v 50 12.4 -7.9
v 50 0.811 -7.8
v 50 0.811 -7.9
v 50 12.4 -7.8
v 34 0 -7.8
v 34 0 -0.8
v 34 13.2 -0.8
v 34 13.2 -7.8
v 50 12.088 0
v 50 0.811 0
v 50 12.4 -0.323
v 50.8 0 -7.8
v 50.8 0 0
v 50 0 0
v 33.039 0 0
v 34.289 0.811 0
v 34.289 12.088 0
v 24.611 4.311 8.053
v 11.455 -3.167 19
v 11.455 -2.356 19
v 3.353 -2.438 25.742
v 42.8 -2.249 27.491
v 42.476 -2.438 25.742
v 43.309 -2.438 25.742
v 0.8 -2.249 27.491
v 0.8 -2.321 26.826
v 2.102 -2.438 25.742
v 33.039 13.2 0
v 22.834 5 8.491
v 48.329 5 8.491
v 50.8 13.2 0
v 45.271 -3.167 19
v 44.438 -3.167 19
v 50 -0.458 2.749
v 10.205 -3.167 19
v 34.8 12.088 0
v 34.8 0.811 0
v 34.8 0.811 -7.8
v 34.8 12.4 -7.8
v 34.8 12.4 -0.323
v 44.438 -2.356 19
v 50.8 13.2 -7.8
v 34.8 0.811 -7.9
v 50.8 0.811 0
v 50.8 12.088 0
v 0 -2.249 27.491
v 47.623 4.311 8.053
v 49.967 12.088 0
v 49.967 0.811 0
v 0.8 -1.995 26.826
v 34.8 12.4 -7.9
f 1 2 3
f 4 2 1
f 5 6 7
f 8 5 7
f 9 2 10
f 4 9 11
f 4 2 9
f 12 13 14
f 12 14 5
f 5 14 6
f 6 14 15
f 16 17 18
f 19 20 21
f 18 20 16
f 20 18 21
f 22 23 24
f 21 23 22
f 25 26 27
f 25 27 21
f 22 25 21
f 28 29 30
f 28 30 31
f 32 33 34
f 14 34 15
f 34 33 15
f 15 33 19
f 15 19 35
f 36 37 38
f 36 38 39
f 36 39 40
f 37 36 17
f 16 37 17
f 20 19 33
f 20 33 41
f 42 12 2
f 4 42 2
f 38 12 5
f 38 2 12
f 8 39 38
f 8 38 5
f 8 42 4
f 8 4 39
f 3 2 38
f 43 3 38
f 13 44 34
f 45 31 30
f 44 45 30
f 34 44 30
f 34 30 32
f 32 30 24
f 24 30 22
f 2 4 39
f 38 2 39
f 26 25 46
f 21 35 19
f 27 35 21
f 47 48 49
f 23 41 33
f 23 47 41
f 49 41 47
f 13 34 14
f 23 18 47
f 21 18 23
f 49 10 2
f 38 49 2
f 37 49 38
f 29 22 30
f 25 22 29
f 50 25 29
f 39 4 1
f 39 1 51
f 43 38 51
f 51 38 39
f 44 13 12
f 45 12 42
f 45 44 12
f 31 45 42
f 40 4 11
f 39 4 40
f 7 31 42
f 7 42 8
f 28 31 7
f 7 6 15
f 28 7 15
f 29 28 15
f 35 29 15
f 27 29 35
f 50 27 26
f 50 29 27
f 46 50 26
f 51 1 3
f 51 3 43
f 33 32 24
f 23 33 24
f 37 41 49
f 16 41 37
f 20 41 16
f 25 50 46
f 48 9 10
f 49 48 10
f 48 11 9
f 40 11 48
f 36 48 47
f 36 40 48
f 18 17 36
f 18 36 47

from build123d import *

# Parameters (mm, degrees)
SIDE_BASE_DEPTH                    = 0.8
SIDE_BASE_2_COUNT                  = 2
SIDE_BASE_2_PITCH                  = 50
FRONT_BACK_WALLS_DEPTH             = 50
BASE_SKETCH_W                      = 50.8
BASE_SKETCH_H                      = 13.2
BASE_SKETCH_W_2                    = 15.2
BASE_SKETCH_H_2                    = 11.276834123
BASE_DEPTH                         = 0.8
ATTACHMENT_BASE_SKETCH_W           = 16.8
ATTACHMENT_BASE_SKETCH_H           = 13.2
ATTACHMENT_BASE_SKETCH_W_2         = 15.2
ATTACHMENT_BASE_SKETCH_H_2         = 11.276834123
ATTACHMENT_BASE_DEPTH              = 7
LEFT_RIGHT_WALL_REMOVAL_DEPTH      = 51
LEFT_RIGHT_WALL_REMOVAL_DEPTH_BACK = 1.8
SKETCH6_W                          = 28.631700026
SKETCH6_H                          = 16.366666667
CUTAWAY_LEFT_DEPTH                 = 8.681373736
LEFT_WALL_DEPTH                    = 0.8331843
SKETCH9_W                          = 44.231215268
SKETCH9_H                          = 16.366666667
CUTAWAY_RIGHT_DEPTH                = 28.12803264
RIGHT_WALL_DEPTH                   = 1.25073473
PIPE_TOP_EXTRA_CUTAWAY_REACH       = 37.291
SKETCH11_W                         = 15.2
SKETCH11_H                         = 0.312130873
SKETCH1_W                          = 15.2
SKETCH1_H                          = 11.588964996
FAN_BASE_DEPTH                     = 0.1


with BuildPart() as part:
    # Side base sketch → Side base (new body)
    with BuildSketch(Plane.ZY):
        Polygon((0, 13.2), (8.491348573, 5), (19.491348573, 0.8030407), (27.491348573, -2.249293336), (19, -3.166666667), (6, -1), (0, 0), align=None)
    extrude(amount=-SIDE_BASE_DEPTH)


with BuildPart() as side_base_2_1:
    # Side base 2: pattern copy
    add(part.part.moved(Location(Vector(1, 0, 0) * (1 * SIDE_BASE_2_PITCH))))


with BuildPart() as part_1:
    add(part.part)

    add(side_base_2_1.part)  # Front back walls merges Side base 2_1
    # Wall base sketch → Front back walls (add)
    with BuildSketch(Plane(origin=(0.8, 0, 0), x_dir=(0, 0, -1), z_dir=(1, 0, 0))):
        Polygon((0, 12.087869127), (-8.053310036, 4.310878025), (-25.742389296, -2.438244311), (-27.491348573, -2.249293336), (-8.491348573, 5), (0, 13.2), align=None)
        Polygon((0, 0.811035004), (-19, -2.355631663), (-19, -3.166666667), (0, 0), align=None)
    extrude(amount=FRONT_BACK_WALLS_DEPTH)

    # Base sketch → Base (add)
    with BuildSketch(Plane(origin=(0, 0, 0), x_dir=(-1, 0, 0), z_dir=(0, 0, -1))):
        with Locations((-25.4, 6.6)):
            Rectangle(BASE_SKETCH_W, BASE_SKETCH_H)
        with Locations((-42.4, 6.449452066)):
            Rectangle(BASE_SKETCH_W_2, BASE_SKETCH_H_2, mode=Mode.SUBTRACT)
    extrude(amount=BASE_DEPTH)

    # Attachment base sketch → Attachment base (add)
    with BuildSketch(Plane(origin=(0, 0, -0.8), x_dir=(-1, 0, 0), z_dir=(0, 0, -1))):
        with Locations((-42.4, 6.6)):
            Rectangle(ATTACHMENT_BASE_SKETCH_W, ATTACHMENT_BASE_SKETCH_H)
        with Locations((-42.4, 6.449452066)):
            Rectangle(ATTACHMENT_BASE_SKETCH_W_2, ATTACHMENT_BASE_SKETCH_H_2, mode=Mode.SUBTRACT)
    extrude(amount=ATTACHMENT_BASE_DEPTH)

    # Sketch4 → Left right wall removal (cut, two sides)
    with BuildSketch(Plane(origin=(0.8, 0, 0), x_dir=(0, 0, -1), z_dir=(1, 0, 0))) as left_right_wall_removal_sk:
        Polygon((-25.742389296, -2.438244311), (-19, -3.166666667), (-19, -2.355631663), (0, 0.811035004), (0, 12.087869127), (-8.053310036, 4.310878025), align=None)
    extrude(amount=LEFT_RIGHT_WALL_REMOVAL_DEPTH, mode=Mode.SUBTRACT)
    extrude(left_right_wall_removal_sk.sketch, amount=-LEFT_RIGHT_WALL_REMOVAL_DEPTH_BACK, mode=Mode.SUBTRACT)

    # Sketch6 → Cutaway left (cut, through all)
    with BuildSketch(Plane(origin=(46.834030083, 0, 13.628732678), x_dir=(0.279410583, 0, -0.960171717), z_dir=(0.960171717, 0, 0.279410583))):
        with Locations((-0.12179239, 5.016666667)):
            Rectangle(SKETCH6_W, SKETCH6_H)
    extrude(amount=CUTAWAY_LEFT_DEPTH, mode=Mode.SUBTRACT)

    # Sketch7 → Left wall (add, along a direction that is not the sketch's normal)
    with BuildSketch(Plane(origin=(46.834030083, 0, 13.628732678), x_dir=(0.279410583, 0, -0.960171717), z_dir=(0.960171717, 0, 0.279410583))):
        Polygon((-5.594069506, -2.355631663), (-5.594069506, -3.166666667), (-12.616135639, -2.438244311), (5.806693265, 4.310878025), (14.194057623, 12.087869127), (14.194057623, 0.811035004), align=None)
    extrude(amount=-LEFT_WALL_DEPTH, dir=(1, 0, 0))

    # Sketch9 → Cutaway right (cut, through all)
    with BuildSketch(Plane(origin=(13.516705988, 0, 16.244117965), x_dir=(0.7686879, 0, -0.639624039), z_dir=(0.639624039, 0, 0.7686879))):
        with Locations((4.531480214, 5.016666667)):
            Rectangle(SKETCH9_W, SKETCH9_H)
    extrude(amount=-CUTAWAY_RIGHT_DEPTH, mode=Mode.SUBTRACT)

    # Sketch10 → Right wall (add, along a direction that is not the sketch's normal)
    with BuildSketch(Plane(origin=(13.516705988, 0, 16.244117965), x_dir=(-0.7686879, 0, 0.639624039), z_dir=(-0.639624039, 0, -0.7686879))):
        Polygon((-25.396353118, 12.087869127), (-25.396353118, 0.811035004), (4.308596716, -2.355631663), (4.308596716, -3.166666667), (14.849772284, -2.438244311), (-12.805659927, 4.310878025), align=None)
    extrude(amount=-RIGHT_WALL_DEPTH, dir=(-1, 0, 0))

    # Pipe top extra cutaway: up to this face of the body (flat: up to its plane)
    pipe_top_extra_cutaway_end = Plane(part_1.part.faces().sort_by_distance((38.932680486, 7.953647195, 4.281112134))[0])
    # Sketch11 → Pipe top extra cutaway (cut, up to the picked face)
    with BuildSketch(Plane(origin=(0, 0, -7.8), x_dir=(-1, 0, 0), z_dir=(0, 0, -1)), mode=Mode.PRIVATE) as pipe_top_extra_cutaway_sk1:
        with Locations((-42.4, 12.243934564)):
            Rectangle(SKETCH11_W, SKETCH11_H)
    pipe_top_extra_cutaway_tool1 = split(extrude(pipe_top_extra_cutaway_sk1.sketch, amount=-PIPE_TOP_EXTRA_CUTAWAY_REACH, mode=Mode.PRIVATE), bisect_by=pipe_top_extra_cutaway_end, keep=Keep.BOTH, mode=Mode.PRIVATE)
    add(pipe_top_extra_cutaway_tool1.solids().sort_by_distance((42.4, 12.243935, -7.8))[0], mode=Mode.SUBTRACT)


with BuildPart() as body_2:
    # Sketch1 → Fan base (new body)
    with BuildSketch(Plane(origin=(0, 0, -7.8), x_dir=(-1, 0, 0), z_dir=(0, 0, -1))):
        with Locations((-42.4, 6.605517502)):
            Rectangle(SKETCH1_W, SKETCH1_H)
    extrude(amount=FAN_BASE_DEPTH)


solid = Compound([part_1.part, body_2.part])
